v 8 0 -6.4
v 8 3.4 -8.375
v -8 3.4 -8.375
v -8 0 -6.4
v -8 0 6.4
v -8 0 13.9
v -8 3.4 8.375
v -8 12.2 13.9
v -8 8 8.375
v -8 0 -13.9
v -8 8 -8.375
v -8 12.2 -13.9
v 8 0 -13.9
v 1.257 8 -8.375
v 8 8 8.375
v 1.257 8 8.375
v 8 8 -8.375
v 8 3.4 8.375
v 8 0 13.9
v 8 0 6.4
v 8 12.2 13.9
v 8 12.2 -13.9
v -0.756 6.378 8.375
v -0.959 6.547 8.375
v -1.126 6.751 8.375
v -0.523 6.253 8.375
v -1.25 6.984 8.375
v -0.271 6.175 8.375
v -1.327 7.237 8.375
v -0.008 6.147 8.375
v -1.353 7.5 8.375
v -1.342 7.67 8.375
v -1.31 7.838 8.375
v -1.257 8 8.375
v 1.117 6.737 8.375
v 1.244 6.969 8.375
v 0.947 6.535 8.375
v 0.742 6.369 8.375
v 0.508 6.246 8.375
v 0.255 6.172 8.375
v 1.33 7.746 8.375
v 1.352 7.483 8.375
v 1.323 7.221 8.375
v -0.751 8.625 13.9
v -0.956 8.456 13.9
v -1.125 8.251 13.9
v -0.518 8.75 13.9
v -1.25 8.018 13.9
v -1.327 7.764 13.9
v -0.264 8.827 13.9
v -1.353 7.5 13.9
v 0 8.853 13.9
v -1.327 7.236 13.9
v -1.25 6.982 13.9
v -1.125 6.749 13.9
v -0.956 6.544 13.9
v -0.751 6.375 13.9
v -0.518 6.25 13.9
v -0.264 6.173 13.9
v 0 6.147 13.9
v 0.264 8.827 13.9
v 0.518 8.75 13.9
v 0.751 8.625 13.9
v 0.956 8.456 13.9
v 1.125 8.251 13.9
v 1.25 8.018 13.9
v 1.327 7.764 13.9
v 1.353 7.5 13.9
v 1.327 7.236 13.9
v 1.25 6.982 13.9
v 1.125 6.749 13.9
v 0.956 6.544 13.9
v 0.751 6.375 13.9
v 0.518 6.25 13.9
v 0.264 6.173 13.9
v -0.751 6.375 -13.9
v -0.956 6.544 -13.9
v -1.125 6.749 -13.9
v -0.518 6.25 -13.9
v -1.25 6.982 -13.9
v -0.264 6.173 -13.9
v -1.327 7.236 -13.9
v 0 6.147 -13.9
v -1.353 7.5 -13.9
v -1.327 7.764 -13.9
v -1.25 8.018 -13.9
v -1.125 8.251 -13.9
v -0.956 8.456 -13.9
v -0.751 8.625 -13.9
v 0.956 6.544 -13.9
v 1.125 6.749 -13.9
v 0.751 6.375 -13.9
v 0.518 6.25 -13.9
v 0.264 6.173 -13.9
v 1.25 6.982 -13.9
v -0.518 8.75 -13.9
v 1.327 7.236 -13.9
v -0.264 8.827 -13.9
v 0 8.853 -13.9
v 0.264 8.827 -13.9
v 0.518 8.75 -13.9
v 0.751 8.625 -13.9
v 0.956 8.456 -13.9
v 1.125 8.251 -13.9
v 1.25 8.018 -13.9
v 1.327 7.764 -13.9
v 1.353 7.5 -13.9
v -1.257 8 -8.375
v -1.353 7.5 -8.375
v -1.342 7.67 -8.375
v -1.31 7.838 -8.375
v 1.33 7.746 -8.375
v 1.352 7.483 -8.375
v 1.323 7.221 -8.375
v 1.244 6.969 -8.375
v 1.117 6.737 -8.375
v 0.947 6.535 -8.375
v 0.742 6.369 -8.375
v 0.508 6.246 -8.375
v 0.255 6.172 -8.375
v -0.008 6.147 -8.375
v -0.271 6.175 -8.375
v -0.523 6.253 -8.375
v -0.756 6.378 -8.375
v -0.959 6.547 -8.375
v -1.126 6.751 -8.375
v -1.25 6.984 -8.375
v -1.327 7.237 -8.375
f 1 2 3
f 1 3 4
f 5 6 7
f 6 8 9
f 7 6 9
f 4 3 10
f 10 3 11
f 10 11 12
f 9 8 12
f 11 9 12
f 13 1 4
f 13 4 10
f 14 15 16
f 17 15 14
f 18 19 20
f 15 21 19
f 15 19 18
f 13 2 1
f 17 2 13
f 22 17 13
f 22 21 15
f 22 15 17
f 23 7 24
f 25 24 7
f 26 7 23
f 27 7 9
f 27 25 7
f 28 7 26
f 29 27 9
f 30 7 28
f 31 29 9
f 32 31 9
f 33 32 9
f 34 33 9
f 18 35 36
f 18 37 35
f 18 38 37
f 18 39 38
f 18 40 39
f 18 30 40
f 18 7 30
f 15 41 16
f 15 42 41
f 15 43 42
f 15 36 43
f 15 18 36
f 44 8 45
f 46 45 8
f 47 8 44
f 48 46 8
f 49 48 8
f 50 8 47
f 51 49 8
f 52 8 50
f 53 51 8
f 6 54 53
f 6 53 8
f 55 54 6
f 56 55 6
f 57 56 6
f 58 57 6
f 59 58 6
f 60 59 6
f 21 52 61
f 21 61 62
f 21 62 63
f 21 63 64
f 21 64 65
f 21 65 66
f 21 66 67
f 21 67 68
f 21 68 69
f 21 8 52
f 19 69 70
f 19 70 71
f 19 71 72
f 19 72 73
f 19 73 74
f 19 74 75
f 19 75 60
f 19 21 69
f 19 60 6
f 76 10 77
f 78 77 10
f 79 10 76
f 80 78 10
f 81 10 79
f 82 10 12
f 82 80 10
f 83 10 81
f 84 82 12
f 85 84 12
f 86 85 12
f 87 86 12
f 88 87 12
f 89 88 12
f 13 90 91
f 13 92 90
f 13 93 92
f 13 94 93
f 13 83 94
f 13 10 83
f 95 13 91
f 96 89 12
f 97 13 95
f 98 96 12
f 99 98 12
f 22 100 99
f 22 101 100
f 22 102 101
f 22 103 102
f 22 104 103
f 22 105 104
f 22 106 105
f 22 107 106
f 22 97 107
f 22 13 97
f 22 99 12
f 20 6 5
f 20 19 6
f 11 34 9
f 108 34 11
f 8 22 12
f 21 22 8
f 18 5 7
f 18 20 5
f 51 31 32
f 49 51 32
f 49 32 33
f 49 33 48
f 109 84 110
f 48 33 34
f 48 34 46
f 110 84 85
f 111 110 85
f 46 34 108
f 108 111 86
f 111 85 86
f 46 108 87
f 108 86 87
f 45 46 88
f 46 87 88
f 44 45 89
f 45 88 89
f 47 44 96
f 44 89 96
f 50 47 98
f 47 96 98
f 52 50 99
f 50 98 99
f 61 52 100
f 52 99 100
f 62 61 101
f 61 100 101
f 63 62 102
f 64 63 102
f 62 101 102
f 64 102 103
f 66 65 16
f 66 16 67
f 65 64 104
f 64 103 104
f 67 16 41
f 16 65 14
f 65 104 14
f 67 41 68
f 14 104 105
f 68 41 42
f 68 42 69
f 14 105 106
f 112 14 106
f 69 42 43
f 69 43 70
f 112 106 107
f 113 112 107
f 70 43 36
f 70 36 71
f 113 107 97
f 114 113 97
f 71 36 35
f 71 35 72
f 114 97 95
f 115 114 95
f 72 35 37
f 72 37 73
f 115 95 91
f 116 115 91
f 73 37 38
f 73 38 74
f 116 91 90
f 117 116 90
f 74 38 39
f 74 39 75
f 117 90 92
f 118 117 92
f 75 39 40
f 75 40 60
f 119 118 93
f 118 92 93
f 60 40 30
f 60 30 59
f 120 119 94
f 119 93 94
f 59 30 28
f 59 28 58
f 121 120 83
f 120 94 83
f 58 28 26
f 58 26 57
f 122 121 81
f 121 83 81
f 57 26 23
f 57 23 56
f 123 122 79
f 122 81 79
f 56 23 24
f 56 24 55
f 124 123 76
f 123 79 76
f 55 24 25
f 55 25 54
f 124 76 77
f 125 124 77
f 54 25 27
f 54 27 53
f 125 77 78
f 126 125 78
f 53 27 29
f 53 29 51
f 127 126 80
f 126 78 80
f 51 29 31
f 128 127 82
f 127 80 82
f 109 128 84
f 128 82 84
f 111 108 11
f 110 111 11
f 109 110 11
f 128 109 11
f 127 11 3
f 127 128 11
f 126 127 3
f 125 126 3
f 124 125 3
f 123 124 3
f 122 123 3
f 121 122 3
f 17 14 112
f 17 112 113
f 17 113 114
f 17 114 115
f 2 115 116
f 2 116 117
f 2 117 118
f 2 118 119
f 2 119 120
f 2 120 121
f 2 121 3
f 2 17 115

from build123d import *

# Parameters (mm, degrees)
BOSS_EXTRUDE1_DEPTH   = 8
F_6_32_TAPPED_HOLE1_D = 2.7051


with BuildPart() as part:
    # Sketch1 → Boss-Extrude1 (new, symmetric)
    with BuildSketch(Plane(origin=(0, 0, 0), x_dir=(0, 0, -1), z_dir=(1, 0, 0))):
        Polygon((-6.4, 0), (-8.375, 3.4), (-8.375, 8), (8.375, 8), (8.375, 3.4), (6.4, 0), (13.9, 0), (13.9, 12.2), (-13.9, 12.2), (-13.9, 0), align=None)
    extrude(amount=BOSS_EXTRUDE1_DEPTH, both=True)

    # #6-32 Tapped Hole1 (through all)
    with Locations(Plane.XY.offset(13.9)):
        with Locations((0, 7.5)):
            Hole(F_6_32_TAPPED_HOLE1_D / 2)


solid = part.part
